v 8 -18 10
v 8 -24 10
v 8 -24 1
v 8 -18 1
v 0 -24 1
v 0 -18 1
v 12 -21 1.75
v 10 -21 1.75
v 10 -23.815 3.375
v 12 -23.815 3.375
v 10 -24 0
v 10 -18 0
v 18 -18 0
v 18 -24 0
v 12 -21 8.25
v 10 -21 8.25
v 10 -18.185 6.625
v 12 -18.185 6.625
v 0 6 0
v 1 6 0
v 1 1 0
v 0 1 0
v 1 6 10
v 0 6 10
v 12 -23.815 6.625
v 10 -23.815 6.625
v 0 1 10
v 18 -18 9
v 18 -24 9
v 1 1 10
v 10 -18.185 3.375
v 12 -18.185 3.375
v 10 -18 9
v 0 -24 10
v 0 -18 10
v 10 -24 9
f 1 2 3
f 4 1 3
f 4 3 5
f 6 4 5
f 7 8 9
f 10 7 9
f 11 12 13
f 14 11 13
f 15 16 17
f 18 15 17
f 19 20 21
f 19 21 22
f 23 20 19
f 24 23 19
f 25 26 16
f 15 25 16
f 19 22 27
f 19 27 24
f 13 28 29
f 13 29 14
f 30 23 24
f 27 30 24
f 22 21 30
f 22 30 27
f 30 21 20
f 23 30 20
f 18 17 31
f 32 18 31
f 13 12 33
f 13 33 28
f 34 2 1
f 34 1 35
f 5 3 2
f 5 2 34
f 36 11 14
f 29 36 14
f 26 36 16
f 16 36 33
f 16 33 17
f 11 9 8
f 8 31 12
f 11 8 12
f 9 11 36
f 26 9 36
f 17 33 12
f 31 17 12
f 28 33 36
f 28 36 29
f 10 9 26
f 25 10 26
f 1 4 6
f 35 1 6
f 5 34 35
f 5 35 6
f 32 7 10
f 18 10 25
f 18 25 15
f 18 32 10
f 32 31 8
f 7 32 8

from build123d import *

# Parameters (mm, degrees)
SKETCH5_W           = 8
SKETCH5_H           = 9
BOSS_EXTRUDE2_DEPTH = 6
SKETCH10_W          = 8
SKETCH10_H          = 9
BOSS_EXTRUDE3_DEPTH = 6
CUT_EXTRUDE1_DEPTH  = 2
SKETCH17_W          = 1
SKETCH17_H          = 5
BOSS_EXTRUDE4_DEPTH = 10


with BuildPart() as part:
    # Sketch5 → Boss-Extrude2 (new body)
    with BuildSketch(Plane(origin=(0, -24, 0), x_dir=(-1, 0, 0), z_dir=(0, -1, 0))):
        with Locations((-4, -5.5)):
            Rectangle(SKETCH5_W, SKETCH5_H)
    extrude(amount=-BOSS_EXTRUDE2_DEPTH)


with BuildPart() as body_2:
    # Sketch10 → Boss-Extrude3 (new body)
    with BuildSketch(Plane(origin=(0, -18, 0), x_dir=(1, 0, 0), z_dir=(0, 1, 0))):
        with Locations((14, -4.5)):
            Rectangle(SKETCH10_W, SKETCH10_H)
    extrude(amount=-BOSS_EXTRUDE3_DEPTH)

    # Sketch11 → Cut-Extrude1 (cut)
    with BuildSketch(Plane.ZY.offset(-10)):
        Polygon((8.25, -21), (6.625, -18.185417438), (3.375, -18.185417438), (1.75, -21), (3.375, -23.814582562), (6.625, -23.814582562), align=None)
    extrude(amount=-CUT_EXTRUDE1_DEPTH, mode=Mode.SUBTRACT)


with BuildPart() as body_3:
    # Sketch17 → Boss-Extrude4 (new body)
    with BuildSketch(Plane(origin=(0, 0, 0), x_dir=(-1, 0, 0), z_dir=(0, 0, -1))):
        with Locations((-0.5, 3.5)):
            Rectangle(SKETCH17_W, SKETCH17_H)
    extrude(amount=-BOSS_EXTRUDE4_DEPTH)


solid = Compound([part.part, body_2.part, body_3.part])
